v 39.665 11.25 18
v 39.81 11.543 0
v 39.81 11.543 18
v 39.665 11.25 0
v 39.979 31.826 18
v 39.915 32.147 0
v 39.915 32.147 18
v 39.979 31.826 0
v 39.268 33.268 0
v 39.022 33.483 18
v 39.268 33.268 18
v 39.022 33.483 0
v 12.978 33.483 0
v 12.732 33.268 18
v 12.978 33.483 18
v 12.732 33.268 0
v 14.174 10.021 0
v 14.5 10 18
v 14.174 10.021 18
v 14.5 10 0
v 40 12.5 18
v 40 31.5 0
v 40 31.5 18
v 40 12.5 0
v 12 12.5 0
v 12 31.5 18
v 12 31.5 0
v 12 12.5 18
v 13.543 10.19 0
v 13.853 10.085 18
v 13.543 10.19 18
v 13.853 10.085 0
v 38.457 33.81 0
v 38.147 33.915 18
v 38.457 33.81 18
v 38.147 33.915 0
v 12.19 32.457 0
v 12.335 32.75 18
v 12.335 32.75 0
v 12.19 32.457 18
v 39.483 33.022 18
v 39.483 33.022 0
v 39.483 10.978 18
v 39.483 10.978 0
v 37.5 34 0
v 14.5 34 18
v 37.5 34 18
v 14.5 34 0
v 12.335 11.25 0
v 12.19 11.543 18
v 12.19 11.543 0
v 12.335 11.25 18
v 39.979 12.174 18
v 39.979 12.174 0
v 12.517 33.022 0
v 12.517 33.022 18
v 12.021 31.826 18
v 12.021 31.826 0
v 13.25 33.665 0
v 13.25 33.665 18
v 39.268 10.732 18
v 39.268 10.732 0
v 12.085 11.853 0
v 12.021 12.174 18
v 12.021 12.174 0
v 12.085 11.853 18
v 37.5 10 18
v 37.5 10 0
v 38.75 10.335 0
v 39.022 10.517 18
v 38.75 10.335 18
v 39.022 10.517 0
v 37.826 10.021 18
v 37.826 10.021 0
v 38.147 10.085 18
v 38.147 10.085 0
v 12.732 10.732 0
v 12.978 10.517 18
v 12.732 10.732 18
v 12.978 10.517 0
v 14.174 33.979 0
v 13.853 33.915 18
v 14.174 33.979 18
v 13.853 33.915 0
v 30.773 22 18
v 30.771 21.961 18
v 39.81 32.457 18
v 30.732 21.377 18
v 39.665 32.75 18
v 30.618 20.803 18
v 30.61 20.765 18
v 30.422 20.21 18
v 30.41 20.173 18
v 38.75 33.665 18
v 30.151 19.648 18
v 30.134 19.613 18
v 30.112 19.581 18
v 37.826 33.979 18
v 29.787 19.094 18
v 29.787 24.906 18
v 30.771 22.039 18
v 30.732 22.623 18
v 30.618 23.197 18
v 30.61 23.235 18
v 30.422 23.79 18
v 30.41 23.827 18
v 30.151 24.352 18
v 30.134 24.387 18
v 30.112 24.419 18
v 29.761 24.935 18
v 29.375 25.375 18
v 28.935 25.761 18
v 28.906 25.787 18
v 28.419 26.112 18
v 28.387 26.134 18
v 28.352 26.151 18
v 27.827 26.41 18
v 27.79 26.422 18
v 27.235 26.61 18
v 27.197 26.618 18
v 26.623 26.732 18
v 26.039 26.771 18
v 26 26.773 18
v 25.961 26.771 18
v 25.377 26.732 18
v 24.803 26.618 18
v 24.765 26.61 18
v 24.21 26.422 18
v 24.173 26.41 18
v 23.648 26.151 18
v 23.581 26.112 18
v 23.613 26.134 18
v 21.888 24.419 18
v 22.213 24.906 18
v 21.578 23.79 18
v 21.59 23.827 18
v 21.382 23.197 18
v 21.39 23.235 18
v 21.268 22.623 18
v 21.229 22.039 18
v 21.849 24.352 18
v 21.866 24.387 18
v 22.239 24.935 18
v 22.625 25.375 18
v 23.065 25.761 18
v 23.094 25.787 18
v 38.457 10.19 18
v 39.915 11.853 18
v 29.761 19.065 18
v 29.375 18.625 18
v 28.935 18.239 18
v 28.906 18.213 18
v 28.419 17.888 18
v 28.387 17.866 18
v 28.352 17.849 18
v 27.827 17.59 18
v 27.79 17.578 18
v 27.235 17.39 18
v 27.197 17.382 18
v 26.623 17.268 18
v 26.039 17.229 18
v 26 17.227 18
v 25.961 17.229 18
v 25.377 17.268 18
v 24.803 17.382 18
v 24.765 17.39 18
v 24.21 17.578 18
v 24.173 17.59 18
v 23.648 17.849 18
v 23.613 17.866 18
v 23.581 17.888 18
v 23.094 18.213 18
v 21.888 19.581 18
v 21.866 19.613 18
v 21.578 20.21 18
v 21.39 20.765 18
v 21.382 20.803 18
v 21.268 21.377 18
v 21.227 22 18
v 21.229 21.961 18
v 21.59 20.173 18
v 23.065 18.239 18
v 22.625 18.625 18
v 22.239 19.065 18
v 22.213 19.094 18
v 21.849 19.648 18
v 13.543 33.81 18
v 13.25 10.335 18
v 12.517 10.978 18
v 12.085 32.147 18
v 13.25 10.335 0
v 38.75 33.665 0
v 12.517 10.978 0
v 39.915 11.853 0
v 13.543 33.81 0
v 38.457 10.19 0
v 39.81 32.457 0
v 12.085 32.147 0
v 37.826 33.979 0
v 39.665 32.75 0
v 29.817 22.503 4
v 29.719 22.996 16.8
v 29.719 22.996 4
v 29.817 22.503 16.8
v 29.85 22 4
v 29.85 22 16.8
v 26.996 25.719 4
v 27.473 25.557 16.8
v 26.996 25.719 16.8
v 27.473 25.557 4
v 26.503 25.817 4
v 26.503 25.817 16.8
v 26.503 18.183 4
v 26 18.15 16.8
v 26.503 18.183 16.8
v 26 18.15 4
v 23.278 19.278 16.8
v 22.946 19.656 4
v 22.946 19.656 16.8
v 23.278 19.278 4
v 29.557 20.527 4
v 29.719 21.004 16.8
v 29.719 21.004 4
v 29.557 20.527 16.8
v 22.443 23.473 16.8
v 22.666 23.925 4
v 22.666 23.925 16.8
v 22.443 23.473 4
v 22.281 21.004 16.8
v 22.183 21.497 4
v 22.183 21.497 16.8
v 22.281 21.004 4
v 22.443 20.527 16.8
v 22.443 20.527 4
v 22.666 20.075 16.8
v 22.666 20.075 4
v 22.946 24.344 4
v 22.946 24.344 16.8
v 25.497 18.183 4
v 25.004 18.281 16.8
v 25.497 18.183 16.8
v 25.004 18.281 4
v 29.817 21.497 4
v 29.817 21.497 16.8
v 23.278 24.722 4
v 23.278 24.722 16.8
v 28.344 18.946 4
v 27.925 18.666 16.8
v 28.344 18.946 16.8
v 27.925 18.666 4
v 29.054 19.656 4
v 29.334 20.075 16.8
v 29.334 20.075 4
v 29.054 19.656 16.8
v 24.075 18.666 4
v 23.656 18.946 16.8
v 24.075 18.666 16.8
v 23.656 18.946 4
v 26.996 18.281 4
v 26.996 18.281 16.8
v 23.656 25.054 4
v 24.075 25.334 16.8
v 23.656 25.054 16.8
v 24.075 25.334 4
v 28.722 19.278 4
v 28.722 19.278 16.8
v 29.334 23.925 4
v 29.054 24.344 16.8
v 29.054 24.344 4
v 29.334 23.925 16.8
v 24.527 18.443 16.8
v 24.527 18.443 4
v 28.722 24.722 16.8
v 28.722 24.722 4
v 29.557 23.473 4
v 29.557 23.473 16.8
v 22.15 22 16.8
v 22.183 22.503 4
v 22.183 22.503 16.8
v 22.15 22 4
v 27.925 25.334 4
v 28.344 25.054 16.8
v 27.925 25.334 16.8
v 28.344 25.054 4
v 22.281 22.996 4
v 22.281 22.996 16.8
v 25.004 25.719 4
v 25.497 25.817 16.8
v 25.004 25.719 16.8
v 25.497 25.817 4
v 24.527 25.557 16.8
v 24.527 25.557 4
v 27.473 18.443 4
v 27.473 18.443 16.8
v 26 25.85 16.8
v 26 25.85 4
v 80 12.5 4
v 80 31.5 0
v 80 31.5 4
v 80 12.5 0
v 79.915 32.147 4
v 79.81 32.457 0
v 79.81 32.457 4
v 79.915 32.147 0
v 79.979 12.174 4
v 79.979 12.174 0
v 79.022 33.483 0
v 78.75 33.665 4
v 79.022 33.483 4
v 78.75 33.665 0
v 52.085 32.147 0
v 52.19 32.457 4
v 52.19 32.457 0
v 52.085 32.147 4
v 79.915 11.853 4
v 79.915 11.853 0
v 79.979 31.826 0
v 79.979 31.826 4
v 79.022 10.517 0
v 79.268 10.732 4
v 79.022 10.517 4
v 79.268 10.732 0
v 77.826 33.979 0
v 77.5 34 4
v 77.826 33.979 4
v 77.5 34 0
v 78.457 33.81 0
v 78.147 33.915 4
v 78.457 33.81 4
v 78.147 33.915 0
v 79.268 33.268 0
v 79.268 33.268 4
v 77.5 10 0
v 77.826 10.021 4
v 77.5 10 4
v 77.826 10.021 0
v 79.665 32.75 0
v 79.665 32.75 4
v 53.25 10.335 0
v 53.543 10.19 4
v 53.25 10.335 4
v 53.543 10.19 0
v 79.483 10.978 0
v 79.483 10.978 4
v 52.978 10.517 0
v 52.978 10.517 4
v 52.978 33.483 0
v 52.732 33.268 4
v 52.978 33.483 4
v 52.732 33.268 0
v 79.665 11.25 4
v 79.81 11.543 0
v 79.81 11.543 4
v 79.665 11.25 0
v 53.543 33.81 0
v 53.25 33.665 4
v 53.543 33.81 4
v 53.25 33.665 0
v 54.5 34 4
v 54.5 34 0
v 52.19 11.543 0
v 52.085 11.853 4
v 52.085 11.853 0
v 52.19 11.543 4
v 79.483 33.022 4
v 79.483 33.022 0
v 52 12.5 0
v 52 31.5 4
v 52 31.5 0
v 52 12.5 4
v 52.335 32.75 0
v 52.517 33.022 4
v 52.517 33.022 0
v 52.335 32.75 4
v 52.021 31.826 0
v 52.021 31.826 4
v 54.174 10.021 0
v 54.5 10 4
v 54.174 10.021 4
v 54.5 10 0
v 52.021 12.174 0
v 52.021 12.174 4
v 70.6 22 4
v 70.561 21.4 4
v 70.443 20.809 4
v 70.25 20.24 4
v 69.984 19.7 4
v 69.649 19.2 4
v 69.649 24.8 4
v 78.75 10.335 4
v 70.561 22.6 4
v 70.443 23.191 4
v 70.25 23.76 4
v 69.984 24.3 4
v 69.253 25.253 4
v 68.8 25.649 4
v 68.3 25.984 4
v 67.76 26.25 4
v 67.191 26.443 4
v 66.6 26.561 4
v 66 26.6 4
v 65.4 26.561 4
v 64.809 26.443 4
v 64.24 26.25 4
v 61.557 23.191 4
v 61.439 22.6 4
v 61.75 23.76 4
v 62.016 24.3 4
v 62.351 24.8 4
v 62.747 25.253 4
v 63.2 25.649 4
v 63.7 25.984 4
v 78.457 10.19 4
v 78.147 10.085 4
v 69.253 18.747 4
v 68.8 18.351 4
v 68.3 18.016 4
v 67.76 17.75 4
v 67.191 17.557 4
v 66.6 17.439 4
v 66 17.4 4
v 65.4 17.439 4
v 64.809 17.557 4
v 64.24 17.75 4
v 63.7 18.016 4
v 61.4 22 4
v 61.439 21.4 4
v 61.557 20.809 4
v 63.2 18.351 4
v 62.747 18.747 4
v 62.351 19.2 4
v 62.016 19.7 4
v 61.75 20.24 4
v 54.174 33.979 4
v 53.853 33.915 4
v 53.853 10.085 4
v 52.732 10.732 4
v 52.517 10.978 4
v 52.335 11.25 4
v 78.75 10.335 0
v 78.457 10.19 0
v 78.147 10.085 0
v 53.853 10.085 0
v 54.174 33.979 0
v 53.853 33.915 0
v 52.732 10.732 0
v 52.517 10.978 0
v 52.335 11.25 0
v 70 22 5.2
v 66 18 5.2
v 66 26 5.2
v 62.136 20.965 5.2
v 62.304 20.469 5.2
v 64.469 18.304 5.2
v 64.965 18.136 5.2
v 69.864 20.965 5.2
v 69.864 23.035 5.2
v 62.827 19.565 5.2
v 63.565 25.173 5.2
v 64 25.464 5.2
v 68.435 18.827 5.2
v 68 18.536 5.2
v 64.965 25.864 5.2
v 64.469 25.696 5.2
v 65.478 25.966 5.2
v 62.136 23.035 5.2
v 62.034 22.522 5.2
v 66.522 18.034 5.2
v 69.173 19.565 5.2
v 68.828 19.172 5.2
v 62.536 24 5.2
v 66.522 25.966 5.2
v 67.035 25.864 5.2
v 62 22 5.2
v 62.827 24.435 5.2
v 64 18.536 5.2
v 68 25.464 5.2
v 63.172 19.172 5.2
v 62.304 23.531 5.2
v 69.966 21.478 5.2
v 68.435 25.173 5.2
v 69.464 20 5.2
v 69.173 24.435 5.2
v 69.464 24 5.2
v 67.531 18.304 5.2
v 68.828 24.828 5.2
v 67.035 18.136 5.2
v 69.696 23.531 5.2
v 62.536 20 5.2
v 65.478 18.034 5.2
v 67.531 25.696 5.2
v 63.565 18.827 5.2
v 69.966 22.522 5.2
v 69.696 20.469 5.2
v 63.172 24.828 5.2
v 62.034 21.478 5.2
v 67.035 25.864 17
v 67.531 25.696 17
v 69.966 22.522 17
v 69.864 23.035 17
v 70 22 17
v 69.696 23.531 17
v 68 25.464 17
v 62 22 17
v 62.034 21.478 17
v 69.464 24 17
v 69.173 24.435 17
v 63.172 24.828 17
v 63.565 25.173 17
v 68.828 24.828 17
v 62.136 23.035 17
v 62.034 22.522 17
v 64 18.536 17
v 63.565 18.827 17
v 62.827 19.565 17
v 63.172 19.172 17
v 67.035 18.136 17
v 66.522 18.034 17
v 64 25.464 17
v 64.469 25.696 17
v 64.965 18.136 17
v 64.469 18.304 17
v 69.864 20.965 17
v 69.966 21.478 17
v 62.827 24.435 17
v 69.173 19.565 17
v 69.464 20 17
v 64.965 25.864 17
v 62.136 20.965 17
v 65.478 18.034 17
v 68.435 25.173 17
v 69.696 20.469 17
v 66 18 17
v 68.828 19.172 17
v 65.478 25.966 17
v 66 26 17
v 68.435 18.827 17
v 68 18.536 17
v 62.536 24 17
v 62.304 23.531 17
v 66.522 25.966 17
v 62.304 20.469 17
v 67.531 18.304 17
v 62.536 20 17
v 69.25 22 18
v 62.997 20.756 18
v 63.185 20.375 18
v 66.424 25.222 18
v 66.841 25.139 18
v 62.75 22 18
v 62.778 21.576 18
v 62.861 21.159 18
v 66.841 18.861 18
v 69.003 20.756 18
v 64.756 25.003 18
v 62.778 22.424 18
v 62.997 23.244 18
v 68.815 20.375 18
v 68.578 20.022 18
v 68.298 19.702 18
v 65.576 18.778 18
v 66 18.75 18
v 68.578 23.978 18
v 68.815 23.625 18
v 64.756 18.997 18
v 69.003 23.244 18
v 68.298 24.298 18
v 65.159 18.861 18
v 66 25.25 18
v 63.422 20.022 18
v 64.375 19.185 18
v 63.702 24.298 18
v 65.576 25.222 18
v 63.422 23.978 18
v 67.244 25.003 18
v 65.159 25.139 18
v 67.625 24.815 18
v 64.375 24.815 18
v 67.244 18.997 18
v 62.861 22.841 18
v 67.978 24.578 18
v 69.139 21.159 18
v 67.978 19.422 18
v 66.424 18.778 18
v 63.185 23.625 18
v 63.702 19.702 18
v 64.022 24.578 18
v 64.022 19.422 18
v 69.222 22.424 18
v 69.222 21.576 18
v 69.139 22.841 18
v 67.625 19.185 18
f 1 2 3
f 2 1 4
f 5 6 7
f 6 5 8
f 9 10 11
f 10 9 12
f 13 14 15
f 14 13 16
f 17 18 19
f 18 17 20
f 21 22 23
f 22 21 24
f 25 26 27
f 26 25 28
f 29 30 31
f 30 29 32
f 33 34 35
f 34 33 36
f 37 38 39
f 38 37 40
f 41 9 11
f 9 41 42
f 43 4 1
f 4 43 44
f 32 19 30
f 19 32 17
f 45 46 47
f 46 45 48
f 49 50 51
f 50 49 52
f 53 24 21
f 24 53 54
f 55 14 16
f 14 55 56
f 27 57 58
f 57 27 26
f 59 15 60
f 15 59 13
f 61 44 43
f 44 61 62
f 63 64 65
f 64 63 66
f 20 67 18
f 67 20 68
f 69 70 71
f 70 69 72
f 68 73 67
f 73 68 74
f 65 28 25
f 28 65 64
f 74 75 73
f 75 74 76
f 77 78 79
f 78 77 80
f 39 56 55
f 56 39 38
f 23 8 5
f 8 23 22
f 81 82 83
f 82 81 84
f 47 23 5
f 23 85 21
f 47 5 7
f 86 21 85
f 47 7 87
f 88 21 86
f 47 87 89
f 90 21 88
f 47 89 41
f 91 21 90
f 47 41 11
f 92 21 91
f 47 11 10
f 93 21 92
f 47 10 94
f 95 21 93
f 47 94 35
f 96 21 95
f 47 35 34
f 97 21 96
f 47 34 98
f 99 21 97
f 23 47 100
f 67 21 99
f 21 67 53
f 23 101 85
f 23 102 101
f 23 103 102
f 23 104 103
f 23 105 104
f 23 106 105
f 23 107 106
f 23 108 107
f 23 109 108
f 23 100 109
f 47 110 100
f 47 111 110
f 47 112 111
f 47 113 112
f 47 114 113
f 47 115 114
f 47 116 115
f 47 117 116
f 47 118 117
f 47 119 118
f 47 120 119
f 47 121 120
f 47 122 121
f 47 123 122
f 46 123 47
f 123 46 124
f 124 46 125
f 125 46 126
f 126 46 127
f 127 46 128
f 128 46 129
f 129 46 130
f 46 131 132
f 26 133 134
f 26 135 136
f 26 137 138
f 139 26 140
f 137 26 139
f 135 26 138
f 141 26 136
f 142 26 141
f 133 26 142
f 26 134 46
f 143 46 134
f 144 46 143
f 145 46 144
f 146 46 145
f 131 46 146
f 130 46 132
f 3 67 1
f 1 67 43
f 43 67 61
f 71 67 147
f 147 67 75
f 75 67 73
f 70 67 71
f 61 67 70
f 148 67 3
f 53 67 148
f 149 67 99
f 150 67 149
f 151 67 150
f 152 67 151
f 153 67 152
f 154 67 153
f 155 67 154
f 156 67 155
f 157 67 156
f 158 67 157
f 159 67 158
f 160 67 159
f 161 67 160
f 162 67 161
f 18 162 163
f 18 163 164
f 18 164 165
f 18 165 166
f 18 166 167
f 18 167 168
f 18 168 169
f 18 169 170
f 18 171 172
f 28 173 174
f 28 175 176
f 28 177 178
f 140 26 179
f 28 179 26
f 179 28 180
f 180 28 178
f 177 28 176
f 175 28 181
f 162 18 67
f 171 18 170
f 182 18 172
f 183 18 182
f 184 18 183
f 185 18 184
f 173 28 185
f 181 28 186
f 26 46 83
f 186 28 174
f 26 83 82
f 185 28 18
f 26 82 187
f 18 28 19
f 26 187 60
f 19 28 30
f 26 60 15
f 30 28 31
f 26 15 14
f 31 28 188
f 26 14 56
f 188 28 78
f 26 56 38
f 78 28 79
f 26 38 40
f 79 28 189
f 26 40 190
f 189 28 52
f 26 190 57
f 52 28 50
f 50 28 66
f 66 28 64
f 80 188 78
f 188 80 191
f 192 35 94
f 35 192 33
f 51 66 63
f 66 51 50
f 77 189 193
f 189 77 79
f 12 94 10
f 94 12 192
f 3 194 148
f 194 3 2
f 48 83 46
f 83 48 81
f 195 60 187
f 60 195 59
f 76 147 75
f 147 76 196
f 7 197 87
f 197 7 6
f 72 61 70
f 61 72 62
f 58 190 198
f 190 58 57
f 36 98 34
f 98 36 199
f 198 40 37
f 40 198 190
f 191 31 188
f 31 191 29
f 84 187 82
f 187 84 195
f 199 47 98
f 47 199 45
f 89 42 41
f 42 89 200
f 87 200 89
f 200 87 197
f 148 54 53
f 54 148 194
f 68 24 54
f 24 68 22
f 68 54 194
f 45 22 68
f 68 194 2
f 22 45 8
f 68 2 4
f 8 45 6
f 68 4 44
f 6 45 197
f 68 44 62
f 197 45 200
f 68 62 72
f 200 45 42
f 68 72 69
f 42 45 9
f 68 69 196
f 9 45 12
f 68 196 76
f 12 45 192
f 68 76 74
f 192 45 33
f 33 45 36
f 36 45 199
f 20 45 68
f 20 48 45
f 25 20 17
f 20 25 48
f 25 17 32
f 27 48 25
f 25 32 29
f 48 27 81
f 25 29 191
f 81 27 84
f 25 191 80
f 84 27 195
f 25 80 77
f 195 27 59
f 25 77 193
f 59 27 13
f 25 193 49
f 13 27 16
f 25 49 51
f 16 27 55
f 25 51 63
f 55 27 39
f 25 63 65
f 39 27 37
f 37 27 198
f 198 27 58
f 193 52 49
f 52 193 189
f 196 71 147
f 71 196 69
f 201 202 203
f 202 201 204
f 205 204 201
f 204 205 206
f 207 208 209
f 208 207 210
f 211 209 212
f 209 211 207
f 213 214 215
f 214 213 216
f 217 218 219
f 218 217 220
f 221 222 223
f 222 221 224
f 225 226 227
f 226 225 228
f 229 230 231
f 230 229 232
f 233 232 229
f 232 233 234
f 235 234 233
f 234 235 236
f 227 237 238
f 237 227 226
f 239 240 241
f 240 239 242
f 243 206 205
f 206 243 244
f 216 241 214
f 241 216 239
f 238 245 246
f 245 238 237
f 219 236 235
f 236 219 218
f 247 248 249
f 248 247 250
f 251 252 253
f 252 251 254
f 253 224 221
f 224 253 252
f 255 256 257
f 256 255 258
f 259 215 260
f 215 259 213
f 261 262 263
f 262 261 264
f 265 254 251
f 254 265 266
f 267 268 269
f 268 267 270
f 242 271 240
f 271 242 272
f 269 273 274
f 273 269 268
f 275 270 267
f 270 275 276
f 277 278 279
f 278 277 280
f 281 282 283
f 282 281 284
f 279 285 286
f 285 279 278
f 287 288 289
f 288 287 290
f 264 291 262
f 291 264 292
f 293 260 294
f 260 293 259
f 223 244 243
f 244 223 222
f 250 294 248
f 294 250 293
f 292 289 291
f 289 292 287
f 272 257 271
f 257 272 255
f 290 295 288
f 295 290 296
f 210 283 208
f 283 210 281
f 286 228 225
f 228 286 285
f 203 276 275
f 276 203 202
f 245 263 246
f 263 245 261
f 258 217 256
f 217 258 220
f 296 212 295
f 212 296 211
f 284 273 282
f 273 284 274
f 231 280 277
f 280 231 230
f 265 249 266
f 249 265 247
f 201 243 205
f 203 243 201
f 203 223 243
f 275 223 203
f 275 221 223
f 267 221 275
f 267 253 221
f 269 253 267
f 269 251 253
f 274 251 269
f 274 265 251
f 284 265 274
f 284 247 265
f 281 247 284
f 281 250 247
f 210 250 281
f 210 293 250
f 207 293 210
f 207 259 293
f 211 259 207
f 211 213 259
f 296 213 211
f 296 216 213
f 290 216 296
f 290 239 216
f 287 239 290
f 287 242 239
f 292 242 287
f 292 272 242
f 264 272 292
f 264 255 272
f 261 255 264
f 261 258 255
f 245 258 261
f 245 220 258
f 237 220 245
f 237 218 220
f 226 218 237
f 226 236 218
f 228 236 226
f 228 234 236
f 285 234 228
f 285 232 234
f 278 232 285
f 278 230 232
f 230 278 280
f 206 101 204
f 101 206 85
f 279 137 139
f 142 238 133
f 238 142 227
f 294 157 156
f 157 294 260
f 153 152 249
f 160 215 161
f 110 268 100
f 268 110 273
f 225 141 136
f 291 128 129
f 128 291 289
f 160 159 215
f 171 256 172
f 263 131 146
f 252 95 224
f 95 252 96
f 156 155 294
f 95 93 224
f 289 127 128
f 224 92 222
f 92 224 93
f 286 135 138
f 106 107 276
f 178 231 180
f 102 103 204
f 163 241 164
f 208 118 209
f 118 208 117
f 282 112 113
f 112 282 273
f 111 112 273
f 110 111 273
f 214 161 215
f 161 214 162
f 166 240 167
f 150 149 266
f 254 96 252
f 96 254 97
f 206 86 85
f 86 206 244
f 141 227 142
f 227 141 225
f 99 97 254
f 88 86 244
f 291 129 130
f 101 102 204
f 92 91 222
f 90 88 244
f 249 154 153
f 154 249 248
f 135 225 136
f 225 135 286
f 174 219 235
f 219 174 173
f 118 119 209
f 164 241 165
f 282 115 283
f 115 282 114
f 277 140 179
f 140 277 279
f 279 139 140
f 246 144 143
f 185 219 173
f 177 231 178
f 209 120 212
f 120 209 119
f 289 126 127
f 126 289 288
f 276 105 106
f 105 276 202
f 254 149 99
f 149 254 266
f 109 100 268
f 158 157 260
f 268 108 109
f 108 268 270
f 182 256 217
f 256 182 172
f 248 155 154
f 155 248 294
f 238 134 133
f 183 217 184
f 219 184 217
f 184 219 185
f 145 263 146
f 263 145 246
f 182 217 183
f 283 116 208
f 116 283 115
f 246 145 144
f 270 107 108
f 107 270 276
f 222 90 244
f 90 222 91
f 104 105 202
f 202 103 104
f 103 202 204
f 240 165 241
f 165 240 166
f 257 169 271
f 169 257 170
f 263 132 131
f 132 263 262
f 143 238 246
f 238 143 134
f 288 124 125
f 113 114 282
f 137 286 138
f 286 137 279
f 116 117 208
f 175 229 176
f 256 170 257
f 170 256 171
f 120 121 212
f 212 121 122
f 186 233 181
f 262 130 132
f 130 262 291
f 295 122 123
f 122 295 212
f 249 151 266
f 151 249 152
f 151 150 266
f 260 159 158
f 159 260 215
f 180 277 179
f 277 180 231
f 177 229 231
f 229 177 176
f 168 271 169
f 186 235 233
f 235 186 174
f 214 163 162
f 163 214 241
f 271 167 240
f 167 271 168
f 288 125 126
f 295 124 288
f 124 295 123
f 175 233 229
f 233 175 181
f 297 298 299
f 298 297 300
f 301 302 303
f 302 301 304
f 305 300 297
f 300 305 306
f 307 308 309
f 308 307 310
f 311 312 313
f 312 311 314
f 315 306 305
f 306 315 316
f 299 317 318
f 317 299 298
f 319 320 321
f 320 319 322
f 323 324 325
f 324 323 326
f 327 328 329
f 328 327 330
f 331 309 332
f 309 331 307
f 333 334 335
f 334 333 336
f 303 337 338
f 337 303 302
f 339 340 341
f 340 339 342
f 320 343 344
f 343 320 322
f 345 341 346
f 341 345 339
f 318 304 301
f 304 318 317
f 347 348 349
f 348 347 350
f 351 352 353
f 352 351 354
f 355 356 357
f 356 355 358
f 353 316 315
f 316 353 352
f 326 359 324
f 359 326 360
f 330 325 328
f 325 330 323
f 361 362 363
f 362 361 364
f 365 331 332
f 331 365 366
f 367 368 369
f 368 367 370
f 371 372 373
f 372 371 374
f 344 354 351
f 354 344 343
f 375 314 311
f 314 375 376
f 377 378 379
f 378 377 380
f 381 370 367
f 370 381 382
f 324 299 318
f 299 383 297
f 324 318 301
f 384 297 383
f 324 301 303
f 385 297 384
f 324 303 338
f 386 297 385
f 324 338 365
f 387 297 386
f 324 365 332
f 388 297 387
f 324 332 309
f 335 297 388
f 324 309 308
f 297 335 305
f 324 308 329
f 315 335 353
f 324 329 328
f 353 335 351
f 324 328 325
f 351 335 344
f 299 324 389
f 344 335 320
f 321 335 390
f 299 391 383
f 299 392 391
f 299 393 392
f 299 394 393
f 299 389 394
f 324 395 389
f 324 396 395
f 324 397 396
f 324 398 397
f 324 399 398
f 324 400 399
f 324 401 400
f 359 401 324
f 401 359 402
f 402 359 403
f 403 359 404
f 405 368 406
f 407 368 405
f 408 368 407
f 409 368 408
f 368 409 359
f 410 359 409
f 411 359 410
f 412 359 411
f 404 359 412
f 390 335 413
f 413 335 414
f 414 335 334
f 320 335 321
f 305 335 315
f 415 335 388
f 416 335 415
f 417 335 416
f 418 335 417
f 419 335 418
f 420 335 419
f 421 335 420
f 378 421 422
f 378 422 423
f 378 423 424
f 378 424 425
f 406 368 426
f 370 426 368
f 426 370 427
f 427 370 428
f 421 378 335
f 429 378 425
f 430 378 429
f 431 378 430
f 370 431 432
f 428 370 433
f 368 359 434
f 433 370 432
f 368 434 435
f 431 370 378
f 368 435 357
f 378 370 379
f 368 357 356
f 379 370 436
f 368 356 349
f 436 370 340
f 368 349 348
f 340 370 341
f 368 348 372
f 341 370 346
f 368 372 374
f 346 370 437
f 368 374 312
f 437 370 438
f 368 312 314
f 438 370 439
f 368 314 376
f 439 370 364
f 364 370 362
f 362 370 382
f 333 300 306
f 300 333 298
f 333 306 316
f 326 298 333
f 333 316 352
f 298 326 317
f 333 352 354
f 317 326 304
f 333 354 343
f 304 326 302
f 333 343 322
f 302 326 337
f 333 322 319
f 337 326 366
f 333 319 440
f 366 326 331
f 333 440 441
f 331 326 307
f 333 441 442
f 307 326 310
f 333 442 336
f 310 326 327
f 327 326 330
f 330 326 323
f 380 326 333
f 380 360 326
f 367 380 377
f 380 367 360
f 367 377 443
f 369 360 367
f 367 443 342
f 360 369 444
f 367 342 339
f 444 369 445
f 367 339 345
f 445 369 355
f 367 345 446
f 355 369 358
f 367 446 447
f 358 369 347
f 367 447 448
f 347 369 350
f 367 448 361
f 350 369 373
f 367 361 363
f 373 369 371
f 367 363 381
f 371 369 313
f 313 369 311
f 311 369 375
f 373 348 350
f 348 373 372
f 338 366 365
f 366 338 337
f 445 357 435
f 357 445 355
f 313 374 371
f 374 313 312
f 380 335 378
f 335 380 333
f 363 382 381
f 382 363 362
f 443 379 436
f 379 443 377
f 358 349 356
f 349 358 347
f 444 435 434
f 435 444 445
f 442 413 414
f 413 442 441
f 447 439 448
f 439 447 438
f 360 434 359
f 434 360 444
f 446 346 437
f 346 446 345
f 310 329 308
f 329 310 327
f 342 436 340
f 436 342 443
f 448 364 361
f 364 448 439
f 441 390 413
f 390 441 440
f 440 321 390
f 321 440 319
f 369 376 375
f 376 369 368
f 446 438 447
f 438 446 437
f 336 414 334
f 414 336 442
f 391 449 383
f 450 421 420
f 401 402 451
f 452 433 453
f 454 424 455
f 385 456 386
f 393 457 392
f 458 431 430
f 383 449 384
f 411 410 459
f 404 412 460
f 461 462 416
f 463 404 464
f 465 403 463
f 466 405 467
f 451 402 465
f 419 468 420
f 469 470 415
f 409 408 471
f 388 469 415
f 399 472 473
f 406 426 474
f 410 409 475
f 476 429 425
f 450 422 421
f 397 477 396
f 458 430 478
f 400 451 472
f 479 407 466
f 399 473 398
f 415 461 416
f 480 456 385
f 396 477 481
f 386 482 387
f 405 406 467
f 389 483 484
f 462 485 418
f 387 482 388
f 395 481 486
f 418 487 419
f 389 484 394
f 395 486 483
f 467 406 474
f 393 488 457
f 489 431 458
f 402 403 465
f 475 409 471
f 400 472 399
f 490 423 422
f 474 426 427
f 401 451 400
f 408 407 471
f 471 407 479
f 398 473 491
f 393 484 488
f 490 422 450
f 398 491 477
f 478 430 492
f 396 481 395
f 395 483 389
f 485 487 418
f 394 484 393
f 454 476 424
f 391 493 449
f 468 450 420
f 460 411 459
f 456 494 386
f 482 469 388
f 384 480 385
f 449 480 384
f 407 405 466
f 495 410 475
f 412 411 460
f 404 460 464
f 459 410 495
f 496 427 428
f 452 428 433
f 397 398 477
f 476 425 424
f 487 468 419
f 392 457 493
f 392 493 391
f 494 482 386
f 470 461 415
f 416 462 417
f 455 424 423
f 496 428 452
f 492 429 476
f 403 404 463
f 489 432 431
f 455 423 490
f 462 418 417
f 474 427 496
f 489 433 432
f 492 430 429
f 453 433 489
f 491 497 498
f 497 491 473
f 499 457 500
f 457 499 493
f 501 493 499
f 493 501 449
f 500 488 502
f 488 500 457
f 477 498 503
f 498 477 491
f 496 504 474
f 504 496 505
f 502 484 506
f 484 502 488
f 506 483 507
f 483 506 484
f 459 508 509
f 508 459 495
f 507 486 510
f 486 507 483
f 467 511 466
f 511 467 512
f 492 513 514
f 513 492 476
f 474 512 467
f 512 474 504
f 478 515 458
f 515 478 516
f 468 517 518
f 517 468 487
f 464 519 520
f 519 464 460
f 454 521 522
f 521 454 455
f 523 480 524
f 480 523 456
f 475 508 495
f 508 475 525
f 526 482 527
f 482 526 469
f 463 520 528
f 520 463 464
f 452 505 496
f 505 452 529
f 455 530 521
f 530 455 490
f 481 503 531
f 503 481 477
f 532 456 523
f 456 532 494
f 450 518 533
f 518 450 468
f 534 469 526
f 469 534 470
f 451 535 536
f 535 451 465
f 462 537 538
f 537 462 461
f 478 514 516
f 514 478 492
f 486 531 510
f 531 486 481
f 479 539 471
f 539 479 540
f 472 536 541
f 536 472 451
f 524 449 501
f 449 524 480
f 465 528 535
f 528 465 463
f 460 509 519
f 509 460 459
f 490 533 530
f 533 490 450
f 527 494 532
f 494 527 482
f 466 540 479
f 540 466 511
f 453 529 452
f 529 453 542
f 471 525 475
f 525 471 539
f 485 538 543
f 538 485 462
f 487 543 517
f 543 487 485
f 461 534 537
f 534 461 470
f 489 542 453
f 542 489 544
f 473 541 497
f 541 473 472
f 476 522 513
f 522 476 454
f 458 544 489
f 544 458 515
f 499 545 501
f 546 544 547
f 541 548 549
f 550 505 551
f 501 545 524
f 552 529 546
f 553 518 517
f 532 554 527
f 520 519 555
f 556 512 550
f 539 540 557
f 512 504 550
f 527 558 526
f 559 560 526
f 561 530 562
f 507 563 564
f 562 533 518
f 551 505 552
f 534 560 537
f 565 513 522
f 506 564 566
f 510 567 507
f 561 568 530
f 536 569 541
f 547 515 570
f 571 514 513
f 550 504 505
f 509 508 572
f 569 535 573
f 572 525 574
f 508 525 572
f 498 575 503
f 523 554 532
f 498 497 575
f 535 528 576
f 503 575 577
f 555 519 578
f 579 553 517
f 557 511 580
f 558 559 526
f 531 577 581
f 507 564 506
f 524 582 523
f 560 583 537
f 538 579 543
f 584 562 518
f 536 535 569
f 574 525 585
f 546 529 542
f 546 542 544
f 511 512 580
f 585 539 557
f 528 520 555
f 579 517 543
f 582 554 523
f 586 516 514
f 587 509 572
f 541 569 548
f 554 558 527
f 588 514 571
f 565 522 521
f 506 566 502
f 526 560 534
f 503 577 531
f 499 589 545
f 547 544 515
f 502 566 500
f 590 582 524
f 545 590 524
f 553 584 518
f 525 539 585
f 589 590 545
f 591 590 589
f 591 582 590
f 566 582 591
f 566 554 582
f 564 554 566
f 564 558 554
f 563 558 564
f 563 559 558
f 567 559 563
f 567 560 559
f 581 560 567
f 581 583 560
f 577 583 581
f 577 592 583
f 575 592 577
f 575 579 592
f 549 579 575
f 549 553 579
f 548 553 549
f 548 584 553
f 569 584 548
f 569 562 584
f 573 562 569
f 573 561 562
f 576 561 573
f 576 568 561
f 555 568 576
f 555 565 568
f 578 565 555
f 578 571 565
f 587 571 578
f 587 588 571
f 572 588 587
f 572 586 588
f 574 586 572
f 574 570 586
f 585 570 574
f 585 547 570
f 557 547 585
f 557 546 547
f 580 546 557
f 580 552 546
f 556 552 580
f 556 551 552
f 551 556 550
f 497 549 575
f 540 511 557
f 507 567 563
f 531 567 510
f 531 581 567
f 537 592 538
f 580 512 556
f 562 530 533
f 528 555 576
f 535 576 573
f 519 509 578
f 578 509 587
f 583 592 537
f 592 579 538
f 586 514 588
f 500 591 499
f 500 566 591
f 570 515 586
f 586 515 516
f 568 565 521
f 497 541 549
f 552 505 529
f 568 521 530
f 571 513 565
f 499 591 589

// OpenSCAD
/*
Sample 037: Dauerhafter Pressstift — 0,15 mm Übermaß
Generated from the FDM Mechanical Sample Library.
Units: millimetres.

Override examples:
  openscad -o custom.stl -D 'view="plate"' -D 'render_fn=64' model.scad
  openscad -o preview.png -D 'view="assembly"' model.scad
*/
use <../../../library/fdm_mechanisms.scad>

render_fn = is_undef(render_fn) ? 48 : render_fn;
view = is_undef(view) ? "plate" : view;
$fn = render_fn;

sample_pressfit_dowel(
    view=view,
    pin_d=8,
    gap=-0.15
);
